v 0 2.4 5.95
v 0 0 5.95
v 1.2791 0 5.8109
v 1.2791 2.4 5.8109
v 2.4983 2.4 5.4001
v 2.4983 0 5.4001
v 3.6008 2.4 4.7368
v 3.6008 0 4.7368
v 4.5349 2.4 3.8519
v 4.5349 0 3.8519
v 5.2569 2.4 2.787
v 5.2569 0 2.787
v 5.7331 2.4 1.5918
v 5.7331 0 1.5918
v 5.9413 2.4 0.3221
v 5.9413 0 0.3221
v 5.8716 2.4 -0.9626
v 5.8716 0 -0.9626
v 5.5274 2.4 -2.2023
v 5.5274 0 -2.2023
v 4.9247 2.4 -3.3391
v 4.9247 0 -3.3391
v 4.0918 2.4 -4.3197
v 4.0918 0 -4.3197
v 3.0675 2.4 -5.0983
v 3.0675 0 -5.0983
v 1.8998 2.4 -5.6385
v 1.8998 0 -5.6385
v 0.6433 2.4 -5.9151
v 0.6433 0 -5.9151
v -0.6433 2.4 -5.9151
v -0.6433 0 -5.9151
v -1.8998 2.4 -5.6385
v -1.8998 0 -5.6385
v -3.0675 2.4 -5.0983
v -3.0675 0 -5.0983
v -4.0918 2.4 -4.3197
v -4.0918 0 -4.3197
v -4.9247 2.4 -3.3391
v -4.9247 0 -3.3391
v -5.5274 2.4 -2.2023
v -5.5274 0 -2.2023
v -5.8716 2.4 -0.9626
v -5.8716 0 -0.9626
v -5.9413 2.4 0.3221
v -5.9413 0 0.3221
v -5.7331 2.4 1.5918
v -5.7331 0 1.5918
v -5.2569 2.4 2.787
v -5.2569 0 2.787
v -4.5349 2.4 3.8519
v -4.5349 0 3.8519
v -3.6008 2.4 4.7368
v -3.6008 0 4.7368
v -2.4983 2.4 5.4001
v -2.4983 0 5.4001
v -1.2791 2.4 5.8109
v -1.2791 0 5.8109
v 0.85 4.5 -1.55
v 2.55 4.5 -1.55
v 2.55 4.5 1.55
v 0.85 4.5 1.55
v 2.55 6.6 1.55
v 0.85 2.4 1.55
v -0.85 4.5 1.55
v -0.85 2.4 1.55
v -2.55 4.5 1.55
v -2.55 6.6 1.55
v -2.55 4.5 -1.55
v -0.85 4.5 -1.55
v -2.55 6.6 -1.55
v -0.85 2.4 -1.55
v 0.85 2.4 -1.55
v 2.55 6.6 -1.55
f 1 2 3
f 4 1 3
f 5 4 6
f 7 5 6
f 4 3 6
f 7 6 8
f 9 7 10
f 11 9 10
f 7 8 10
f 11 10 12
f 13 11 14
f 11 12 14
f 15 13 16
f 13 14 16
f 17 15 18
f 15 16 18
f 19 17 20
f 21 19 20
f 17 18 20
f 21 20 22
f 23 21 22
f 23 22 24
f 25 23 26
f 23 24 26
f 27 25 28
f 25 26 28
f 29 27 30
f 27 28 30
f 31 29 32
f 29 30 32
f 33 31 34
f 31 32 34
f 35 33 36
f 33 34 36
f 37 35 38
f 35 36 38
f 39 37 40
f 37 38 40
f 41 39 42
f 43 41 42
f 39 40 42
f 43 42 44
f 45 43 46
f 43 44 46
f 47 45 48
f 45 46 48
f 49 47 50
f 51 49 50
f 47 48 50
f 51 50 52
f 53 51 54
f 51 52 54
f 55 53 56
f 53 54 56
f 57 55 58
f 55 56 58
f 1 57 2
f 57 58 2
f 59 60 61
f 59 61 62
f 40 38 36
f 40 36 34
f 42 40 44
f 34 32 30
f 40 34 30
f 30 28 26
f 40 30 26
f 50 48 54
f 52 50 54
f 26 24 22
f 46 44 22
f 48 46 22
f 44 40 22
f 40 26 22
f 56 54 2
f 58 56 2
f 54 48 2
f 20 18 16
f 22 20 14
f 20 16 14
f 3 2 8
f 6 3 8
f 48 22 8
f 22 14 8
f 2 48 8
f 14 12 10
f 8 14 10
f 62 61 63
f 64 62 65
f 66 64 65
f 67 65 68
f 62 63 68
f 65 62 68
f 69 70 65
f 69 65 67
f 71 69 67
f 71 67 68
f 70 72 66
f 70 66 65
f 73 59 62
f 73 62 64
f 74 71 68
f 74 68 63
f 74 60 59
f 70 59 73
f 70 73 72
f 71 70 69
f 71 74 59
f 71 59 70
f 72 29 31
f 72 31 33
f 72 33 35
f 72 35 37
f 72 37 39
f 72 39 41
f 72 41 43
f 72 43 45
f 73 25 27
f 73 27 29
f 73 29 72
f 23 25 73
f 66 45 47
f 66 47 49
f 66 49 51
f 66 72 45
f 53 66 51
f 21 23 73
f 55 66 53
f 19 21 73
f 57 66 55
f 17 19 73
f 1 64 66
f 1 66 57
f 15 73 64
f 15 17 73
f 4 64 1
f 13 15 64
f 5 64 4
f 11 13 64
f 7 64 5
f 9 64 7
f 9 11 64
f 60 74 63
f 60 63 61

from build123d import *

# Parameters (mm, degrees)
SKETCH2_R                = 5.95
BOSS_EXTRUDE2_DEPTH      = 2.4
BOSS_EXTRUDE3_DEPTH      = 1.55
BOSS_EXTRUDE3_DEPTH_BACK = 1.55


with BuildPart() as part:
    # Sketch2 → Boss-Extrude2 (new body)
    with BuildSketch(Plane(origin=(0, 0, 0), x_dir=(1, 0, 0), z_dir=(0, 1, 0))):
        with Locations(Location((0, 0, 0), (0, 0, 270))):
            Circle(SKETCH2_R)
    extrude(amount=BOSS_EXTRUDE2_DEPTH)

    # Sketch4 → Boss-Extrude3 (add, two sides: drawn at the far end of the back side and taken through both)
    with BuildSketch(Plane.XY.offset(-BOSS_EXTRUDE3_DEPTH_BACK)):
        Polygon((-0.85, 2.4), (-0.85, 4.5), (-2.55, 4.5), (-2.55, 6.6), (2.55, 6.6), (2.55, 4.5), (0.85, 4.5), (0.85, 2.4), align=None)
    extrude(amount=BOSS_EXTRUDE3_DEPTH + BOSS_EXTRUDE3_DEPTH_BACK)


solid = part.part
